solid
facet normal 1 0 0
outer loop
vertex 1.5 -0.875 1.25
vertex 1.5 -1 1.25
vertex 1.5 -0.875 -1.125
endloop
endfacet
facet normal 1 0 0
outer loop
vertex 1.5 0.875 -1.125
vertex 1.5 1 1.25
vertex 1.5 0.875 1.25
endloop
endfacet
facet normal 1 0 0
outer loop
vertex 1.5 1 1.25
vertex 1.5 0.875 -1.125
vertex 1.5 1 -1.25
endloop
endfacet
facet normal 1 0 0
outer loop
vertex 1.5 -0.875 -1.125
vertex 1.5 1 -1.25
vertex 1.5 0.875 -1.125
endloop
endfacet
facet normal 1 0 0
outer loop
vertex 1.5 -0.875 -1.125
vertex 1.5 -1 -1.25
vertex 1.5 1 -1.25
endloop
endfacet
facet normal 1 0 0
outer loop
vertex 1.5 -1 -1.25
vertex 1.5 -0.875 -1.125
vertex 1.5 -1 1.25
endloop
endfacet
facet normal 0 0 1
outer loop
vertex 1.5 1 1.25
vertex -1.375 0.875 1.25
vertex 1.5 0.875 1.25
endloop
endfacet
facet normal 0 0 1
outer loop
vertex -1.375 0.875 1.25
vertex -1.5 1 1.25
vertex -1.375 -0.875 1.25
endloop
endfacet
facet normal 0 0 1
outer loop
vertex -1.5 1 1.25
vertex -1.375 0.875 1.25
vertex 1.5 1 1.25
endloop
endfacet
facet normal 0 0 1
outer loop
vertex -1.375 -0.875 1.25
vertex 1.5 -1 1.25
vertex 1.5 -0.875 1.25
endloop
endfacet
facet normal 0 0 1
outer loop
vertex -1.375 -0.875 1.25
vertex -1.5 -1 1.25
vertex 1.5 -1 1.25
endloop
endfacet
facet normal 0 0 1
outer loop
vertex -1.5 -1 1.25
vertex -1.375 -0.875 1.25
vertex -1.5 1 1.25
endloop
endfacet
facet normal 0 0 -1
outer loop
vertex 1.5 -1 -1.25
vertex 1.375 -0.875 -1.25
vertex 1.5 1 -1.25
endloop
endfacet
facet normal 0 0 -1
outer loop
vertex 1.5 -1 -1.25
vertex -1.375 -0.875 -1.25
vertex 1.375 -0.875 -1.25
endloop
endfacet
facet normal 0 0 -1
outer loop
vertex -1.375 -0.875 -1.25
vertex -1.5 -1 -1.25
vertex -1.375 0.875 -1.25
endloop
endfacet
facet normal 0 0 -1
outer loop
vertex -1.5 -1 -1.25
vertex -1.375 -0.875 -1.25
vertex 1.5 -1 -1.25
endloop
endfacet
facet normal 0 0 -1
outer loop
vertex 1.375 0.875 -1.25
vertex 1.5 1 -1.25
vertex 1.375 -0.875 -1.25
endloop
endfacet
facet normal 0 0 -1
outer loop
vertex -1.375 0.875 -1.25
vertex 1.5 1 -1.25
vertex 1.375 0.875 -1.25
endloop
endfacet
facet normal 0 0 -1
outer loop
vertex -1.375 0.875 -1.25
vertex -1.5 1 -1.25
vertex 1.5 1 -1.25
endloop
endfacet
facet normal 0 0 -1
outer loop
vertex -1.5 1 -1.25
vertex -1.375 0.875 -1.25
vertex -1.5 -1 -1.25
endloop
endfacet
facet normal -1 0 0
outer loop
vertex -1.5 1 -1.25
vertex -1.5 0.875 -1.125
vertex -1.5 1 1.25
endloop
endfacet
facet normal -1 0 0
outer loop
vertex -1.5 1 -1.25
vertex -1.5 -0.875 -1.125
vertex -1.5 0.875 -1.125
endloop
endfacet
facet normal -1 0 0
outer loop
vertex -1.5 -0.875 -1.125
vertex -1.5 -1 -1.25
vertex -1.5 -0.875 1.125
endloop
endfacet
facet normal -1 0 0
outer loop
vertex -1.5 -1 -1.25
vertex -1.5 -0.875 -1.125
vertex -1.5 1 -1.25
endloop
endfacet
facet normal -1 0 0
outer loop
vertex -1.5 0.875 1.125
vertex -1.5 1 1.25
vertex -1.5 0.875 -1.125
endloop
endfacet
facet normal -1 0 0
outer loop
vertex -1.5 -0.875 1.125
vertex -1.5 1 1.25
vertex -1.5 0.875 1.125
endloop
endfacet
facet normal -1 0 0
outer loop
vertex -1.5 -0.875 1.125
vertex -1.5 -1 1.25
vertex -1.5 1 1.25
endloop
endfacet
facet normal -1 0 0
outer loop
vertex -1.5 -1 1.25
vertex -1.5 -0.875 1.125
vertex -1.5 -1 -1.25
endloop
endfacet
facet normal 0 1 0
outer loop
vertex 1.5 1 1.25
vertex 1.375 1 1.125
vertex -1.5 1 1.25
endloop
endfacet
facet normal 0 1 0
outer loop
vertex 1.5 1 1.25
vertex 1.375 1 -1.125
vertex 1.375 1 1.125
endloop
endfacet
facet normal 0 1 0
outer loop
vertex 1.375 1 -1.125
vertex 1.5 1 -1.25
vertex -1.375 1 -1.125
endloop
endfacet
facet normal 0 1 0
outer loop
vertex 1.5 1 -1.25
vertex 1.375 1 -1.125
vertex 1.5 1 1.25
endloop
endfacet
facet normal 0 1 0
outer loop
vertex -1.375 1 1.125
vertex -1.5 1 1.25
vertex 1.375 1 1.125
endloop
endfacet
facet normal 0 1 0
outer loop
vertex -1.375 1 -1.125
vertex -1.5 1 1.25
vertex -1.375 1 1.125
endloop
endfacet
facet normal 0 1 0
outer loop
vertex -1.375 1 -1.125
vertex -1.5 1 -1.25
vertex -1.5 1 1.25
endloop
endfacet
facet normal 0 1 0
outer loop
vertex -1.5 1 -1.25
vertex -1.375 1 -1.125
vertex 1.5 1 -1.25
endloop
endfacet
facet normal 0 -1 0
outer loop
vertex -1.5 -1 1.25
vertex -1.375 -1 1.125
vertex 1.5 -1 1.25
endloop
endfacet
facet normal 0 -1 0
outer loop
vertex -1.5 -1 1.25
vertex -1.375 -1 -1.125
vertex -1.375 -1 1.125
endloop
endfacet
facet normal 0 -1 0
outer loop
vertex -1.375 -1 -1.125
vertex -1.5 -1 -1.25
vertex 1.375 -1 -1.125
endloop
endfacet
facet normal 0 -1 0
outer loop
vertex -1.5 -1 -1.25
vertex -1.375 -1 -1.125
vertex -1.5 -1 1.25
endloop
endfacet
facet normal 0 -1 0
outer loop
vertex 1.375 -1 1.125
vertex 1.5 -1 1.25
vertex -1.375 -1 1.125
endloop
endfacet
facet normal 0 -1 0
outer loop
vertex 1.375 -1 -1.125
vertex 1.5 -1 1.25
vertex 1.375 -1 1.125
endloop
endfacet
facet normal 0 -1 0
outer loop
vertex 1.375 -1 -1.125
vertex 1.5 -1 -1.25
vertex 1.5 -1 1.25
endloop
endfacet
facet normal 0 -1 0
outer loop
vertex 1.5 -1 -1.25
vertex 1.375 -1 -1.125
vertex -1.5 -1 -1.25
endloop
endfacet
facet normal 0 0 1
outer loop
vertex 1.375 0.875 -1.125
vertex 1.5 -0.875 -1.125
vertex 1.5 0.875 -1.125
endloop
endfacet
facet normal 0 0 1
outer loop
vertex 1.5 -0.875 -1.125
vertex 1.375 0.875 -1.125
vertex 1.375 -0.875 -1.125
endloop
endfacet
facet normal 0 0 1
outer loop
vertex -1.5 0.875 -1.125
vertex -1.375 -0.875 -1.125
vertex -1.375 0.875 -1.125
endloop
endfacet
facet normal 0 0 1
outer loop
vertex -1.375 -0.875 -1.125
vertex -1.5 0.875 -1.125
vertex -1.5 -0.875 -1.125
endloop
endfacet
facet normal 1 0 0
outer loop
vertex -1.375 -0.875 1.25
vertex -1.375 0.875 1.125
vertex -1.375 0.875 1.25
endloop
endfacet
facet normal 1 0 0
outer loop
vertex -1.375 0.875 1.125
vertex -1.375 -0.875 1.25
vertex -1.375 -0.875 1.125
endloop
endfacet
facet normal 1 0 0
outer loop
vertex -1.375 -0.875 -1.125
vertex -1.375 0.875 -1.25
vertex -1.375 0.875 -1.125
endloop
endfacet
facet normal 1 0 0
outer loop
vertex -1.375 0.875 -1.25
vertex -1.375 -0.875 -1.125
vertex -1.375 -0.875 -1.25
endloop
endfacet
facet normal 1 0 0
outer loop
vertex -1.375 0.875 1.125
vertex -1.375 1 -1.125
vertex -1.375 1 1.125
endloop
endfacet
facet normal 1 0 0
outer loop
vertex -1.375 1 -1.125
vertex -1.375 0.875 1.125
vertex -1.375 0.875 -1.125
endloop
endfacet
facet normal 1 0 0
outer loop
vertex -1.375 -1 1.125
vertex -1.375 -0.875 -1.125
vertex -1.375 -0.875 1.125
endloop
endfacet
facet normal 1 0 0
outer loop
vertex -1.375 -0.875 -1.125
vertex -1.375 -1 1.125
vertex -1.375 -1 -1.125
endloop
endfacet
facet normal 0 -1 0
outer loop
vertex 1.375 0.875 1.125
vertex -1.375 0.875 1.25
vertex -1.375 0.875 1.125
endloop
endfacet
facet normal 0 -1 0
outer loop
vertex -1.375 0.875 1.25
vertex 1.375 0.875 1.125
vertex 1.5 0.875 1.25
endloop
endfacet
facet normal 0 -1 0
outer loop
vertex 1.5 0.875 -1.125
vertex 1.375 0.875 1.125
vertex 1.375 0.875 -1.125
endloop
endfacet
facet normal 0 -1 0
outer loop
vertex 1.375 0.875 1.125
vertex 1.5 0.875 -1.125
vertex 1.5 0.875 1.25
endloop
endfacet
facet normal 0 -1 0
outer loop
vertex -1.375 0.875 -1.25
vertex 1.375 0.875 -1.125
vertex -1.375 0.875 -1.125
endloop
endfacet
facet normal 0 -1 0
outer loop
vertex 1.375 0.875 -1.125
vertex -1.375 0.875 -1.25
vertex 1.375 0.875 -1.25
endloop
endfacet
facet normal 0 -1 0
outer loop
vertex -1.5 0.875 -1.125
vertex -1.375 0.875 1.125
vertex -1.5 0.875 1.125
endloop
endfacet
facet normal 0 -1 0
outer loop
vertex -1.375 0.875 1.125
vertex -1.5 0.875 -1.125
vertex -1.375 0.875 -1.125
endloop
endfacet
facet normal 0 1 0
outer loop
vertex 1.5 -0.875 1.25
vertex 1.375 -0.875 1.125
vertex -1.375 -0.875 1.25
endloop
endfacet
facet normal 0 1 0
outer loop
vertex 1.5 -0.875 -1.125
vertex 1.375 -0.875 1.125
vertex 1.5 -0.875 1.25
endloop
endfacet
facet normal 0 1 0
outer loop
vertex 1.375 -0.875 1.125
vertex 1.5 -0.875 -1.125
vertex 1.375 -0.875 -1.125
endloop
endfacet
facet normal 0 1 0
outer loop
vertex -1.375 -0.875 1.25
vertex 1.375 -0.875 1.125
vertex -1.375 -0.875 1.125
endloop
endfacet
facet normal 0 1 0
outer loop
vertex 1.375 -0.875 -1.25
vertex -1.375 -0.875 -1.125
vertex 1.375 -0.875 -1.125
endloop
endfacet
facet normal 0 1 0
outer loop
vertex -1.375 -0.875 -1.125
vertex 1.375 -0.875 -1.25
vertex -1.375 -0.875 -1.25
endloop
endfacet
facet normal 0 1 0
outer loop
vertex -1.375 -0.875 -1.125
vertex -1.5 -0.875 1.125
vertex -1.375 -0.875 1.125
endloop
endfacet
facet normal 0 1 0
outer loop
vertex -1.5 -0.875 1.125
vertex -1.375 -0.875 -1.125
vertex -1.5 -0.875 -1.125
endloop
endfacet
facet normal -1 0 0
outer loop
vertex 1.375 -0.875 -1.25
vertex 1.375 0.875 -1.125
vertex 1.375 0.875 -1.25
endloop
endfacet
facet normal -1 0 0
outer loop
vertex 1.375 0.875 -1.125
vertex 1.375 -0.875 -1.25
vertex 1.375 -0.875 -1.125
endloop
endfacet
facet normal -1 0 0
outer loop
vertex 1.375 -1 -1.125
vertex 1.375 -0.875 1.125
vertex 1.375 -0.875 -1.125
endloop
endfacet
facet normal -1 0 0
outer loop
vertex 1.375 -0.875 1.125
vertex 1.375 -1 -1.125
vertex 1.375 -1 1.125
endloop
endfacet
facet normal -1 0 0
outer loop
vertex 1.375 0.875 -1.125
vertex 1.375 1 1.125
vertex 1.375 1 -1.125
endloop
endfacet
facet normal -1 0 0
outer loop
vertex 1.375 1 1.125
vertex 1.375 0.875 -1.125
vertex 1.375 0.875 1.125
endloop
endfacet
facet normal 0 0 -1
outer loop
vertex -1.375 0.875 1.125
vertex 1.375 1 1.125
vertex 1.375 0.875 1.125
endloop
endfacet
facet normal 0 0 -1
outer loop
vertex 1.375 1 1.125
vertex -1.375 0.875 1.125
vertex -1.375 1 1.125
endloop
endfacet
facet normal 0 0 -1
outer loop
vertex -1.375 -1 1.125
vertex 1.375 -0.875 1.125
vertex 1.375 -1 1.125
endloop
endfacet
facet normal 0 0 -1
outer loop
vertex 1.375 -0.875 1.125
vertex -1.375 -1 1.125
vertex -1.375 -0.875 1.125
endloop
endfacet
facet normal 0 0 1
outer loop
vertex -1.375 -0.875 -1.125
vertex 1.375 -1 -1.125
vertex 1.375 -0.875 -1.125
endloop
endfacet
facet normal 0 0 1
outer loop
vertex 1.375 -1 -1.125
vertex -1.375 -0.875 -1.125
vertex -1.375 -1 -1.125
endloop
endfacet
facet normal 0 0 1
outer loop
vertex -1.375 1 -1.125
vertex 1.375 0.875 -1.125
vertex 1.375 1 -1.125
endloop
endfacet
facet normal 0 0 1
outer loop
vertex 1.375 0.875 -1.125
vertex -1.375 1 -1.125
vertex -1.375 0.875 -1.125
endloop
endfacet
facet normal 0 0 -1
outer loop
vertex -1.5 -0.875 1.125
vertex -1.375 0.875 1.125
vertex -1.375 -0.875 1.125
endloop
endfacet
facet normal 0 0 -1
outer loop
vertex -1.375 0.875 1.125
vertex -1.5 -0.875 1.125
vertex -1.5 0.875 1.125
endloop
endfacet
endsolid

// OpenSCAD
$Slop=1/8;

difference() {
    // Draw the OUTSIDE of the cube
    cube([3,2,2.5],center=true);
    
    // Move up and forward to take away
    translate([$Slop,0,$Slop])
    cube([3,2-$Slop*2,2.5],center=true);
    
    translate([0,0,-$Slop*2])
    cube([3-$Slop*2,2-$Slop*2,2.5-$Slop*2],center=true);

    cube([3-$Slop*2,3,2.5-$Slop*2],center=true);
    
    cube([4-$Slop*2,2-$Slop*2,2.5-$Slop*2],center=true);
}
